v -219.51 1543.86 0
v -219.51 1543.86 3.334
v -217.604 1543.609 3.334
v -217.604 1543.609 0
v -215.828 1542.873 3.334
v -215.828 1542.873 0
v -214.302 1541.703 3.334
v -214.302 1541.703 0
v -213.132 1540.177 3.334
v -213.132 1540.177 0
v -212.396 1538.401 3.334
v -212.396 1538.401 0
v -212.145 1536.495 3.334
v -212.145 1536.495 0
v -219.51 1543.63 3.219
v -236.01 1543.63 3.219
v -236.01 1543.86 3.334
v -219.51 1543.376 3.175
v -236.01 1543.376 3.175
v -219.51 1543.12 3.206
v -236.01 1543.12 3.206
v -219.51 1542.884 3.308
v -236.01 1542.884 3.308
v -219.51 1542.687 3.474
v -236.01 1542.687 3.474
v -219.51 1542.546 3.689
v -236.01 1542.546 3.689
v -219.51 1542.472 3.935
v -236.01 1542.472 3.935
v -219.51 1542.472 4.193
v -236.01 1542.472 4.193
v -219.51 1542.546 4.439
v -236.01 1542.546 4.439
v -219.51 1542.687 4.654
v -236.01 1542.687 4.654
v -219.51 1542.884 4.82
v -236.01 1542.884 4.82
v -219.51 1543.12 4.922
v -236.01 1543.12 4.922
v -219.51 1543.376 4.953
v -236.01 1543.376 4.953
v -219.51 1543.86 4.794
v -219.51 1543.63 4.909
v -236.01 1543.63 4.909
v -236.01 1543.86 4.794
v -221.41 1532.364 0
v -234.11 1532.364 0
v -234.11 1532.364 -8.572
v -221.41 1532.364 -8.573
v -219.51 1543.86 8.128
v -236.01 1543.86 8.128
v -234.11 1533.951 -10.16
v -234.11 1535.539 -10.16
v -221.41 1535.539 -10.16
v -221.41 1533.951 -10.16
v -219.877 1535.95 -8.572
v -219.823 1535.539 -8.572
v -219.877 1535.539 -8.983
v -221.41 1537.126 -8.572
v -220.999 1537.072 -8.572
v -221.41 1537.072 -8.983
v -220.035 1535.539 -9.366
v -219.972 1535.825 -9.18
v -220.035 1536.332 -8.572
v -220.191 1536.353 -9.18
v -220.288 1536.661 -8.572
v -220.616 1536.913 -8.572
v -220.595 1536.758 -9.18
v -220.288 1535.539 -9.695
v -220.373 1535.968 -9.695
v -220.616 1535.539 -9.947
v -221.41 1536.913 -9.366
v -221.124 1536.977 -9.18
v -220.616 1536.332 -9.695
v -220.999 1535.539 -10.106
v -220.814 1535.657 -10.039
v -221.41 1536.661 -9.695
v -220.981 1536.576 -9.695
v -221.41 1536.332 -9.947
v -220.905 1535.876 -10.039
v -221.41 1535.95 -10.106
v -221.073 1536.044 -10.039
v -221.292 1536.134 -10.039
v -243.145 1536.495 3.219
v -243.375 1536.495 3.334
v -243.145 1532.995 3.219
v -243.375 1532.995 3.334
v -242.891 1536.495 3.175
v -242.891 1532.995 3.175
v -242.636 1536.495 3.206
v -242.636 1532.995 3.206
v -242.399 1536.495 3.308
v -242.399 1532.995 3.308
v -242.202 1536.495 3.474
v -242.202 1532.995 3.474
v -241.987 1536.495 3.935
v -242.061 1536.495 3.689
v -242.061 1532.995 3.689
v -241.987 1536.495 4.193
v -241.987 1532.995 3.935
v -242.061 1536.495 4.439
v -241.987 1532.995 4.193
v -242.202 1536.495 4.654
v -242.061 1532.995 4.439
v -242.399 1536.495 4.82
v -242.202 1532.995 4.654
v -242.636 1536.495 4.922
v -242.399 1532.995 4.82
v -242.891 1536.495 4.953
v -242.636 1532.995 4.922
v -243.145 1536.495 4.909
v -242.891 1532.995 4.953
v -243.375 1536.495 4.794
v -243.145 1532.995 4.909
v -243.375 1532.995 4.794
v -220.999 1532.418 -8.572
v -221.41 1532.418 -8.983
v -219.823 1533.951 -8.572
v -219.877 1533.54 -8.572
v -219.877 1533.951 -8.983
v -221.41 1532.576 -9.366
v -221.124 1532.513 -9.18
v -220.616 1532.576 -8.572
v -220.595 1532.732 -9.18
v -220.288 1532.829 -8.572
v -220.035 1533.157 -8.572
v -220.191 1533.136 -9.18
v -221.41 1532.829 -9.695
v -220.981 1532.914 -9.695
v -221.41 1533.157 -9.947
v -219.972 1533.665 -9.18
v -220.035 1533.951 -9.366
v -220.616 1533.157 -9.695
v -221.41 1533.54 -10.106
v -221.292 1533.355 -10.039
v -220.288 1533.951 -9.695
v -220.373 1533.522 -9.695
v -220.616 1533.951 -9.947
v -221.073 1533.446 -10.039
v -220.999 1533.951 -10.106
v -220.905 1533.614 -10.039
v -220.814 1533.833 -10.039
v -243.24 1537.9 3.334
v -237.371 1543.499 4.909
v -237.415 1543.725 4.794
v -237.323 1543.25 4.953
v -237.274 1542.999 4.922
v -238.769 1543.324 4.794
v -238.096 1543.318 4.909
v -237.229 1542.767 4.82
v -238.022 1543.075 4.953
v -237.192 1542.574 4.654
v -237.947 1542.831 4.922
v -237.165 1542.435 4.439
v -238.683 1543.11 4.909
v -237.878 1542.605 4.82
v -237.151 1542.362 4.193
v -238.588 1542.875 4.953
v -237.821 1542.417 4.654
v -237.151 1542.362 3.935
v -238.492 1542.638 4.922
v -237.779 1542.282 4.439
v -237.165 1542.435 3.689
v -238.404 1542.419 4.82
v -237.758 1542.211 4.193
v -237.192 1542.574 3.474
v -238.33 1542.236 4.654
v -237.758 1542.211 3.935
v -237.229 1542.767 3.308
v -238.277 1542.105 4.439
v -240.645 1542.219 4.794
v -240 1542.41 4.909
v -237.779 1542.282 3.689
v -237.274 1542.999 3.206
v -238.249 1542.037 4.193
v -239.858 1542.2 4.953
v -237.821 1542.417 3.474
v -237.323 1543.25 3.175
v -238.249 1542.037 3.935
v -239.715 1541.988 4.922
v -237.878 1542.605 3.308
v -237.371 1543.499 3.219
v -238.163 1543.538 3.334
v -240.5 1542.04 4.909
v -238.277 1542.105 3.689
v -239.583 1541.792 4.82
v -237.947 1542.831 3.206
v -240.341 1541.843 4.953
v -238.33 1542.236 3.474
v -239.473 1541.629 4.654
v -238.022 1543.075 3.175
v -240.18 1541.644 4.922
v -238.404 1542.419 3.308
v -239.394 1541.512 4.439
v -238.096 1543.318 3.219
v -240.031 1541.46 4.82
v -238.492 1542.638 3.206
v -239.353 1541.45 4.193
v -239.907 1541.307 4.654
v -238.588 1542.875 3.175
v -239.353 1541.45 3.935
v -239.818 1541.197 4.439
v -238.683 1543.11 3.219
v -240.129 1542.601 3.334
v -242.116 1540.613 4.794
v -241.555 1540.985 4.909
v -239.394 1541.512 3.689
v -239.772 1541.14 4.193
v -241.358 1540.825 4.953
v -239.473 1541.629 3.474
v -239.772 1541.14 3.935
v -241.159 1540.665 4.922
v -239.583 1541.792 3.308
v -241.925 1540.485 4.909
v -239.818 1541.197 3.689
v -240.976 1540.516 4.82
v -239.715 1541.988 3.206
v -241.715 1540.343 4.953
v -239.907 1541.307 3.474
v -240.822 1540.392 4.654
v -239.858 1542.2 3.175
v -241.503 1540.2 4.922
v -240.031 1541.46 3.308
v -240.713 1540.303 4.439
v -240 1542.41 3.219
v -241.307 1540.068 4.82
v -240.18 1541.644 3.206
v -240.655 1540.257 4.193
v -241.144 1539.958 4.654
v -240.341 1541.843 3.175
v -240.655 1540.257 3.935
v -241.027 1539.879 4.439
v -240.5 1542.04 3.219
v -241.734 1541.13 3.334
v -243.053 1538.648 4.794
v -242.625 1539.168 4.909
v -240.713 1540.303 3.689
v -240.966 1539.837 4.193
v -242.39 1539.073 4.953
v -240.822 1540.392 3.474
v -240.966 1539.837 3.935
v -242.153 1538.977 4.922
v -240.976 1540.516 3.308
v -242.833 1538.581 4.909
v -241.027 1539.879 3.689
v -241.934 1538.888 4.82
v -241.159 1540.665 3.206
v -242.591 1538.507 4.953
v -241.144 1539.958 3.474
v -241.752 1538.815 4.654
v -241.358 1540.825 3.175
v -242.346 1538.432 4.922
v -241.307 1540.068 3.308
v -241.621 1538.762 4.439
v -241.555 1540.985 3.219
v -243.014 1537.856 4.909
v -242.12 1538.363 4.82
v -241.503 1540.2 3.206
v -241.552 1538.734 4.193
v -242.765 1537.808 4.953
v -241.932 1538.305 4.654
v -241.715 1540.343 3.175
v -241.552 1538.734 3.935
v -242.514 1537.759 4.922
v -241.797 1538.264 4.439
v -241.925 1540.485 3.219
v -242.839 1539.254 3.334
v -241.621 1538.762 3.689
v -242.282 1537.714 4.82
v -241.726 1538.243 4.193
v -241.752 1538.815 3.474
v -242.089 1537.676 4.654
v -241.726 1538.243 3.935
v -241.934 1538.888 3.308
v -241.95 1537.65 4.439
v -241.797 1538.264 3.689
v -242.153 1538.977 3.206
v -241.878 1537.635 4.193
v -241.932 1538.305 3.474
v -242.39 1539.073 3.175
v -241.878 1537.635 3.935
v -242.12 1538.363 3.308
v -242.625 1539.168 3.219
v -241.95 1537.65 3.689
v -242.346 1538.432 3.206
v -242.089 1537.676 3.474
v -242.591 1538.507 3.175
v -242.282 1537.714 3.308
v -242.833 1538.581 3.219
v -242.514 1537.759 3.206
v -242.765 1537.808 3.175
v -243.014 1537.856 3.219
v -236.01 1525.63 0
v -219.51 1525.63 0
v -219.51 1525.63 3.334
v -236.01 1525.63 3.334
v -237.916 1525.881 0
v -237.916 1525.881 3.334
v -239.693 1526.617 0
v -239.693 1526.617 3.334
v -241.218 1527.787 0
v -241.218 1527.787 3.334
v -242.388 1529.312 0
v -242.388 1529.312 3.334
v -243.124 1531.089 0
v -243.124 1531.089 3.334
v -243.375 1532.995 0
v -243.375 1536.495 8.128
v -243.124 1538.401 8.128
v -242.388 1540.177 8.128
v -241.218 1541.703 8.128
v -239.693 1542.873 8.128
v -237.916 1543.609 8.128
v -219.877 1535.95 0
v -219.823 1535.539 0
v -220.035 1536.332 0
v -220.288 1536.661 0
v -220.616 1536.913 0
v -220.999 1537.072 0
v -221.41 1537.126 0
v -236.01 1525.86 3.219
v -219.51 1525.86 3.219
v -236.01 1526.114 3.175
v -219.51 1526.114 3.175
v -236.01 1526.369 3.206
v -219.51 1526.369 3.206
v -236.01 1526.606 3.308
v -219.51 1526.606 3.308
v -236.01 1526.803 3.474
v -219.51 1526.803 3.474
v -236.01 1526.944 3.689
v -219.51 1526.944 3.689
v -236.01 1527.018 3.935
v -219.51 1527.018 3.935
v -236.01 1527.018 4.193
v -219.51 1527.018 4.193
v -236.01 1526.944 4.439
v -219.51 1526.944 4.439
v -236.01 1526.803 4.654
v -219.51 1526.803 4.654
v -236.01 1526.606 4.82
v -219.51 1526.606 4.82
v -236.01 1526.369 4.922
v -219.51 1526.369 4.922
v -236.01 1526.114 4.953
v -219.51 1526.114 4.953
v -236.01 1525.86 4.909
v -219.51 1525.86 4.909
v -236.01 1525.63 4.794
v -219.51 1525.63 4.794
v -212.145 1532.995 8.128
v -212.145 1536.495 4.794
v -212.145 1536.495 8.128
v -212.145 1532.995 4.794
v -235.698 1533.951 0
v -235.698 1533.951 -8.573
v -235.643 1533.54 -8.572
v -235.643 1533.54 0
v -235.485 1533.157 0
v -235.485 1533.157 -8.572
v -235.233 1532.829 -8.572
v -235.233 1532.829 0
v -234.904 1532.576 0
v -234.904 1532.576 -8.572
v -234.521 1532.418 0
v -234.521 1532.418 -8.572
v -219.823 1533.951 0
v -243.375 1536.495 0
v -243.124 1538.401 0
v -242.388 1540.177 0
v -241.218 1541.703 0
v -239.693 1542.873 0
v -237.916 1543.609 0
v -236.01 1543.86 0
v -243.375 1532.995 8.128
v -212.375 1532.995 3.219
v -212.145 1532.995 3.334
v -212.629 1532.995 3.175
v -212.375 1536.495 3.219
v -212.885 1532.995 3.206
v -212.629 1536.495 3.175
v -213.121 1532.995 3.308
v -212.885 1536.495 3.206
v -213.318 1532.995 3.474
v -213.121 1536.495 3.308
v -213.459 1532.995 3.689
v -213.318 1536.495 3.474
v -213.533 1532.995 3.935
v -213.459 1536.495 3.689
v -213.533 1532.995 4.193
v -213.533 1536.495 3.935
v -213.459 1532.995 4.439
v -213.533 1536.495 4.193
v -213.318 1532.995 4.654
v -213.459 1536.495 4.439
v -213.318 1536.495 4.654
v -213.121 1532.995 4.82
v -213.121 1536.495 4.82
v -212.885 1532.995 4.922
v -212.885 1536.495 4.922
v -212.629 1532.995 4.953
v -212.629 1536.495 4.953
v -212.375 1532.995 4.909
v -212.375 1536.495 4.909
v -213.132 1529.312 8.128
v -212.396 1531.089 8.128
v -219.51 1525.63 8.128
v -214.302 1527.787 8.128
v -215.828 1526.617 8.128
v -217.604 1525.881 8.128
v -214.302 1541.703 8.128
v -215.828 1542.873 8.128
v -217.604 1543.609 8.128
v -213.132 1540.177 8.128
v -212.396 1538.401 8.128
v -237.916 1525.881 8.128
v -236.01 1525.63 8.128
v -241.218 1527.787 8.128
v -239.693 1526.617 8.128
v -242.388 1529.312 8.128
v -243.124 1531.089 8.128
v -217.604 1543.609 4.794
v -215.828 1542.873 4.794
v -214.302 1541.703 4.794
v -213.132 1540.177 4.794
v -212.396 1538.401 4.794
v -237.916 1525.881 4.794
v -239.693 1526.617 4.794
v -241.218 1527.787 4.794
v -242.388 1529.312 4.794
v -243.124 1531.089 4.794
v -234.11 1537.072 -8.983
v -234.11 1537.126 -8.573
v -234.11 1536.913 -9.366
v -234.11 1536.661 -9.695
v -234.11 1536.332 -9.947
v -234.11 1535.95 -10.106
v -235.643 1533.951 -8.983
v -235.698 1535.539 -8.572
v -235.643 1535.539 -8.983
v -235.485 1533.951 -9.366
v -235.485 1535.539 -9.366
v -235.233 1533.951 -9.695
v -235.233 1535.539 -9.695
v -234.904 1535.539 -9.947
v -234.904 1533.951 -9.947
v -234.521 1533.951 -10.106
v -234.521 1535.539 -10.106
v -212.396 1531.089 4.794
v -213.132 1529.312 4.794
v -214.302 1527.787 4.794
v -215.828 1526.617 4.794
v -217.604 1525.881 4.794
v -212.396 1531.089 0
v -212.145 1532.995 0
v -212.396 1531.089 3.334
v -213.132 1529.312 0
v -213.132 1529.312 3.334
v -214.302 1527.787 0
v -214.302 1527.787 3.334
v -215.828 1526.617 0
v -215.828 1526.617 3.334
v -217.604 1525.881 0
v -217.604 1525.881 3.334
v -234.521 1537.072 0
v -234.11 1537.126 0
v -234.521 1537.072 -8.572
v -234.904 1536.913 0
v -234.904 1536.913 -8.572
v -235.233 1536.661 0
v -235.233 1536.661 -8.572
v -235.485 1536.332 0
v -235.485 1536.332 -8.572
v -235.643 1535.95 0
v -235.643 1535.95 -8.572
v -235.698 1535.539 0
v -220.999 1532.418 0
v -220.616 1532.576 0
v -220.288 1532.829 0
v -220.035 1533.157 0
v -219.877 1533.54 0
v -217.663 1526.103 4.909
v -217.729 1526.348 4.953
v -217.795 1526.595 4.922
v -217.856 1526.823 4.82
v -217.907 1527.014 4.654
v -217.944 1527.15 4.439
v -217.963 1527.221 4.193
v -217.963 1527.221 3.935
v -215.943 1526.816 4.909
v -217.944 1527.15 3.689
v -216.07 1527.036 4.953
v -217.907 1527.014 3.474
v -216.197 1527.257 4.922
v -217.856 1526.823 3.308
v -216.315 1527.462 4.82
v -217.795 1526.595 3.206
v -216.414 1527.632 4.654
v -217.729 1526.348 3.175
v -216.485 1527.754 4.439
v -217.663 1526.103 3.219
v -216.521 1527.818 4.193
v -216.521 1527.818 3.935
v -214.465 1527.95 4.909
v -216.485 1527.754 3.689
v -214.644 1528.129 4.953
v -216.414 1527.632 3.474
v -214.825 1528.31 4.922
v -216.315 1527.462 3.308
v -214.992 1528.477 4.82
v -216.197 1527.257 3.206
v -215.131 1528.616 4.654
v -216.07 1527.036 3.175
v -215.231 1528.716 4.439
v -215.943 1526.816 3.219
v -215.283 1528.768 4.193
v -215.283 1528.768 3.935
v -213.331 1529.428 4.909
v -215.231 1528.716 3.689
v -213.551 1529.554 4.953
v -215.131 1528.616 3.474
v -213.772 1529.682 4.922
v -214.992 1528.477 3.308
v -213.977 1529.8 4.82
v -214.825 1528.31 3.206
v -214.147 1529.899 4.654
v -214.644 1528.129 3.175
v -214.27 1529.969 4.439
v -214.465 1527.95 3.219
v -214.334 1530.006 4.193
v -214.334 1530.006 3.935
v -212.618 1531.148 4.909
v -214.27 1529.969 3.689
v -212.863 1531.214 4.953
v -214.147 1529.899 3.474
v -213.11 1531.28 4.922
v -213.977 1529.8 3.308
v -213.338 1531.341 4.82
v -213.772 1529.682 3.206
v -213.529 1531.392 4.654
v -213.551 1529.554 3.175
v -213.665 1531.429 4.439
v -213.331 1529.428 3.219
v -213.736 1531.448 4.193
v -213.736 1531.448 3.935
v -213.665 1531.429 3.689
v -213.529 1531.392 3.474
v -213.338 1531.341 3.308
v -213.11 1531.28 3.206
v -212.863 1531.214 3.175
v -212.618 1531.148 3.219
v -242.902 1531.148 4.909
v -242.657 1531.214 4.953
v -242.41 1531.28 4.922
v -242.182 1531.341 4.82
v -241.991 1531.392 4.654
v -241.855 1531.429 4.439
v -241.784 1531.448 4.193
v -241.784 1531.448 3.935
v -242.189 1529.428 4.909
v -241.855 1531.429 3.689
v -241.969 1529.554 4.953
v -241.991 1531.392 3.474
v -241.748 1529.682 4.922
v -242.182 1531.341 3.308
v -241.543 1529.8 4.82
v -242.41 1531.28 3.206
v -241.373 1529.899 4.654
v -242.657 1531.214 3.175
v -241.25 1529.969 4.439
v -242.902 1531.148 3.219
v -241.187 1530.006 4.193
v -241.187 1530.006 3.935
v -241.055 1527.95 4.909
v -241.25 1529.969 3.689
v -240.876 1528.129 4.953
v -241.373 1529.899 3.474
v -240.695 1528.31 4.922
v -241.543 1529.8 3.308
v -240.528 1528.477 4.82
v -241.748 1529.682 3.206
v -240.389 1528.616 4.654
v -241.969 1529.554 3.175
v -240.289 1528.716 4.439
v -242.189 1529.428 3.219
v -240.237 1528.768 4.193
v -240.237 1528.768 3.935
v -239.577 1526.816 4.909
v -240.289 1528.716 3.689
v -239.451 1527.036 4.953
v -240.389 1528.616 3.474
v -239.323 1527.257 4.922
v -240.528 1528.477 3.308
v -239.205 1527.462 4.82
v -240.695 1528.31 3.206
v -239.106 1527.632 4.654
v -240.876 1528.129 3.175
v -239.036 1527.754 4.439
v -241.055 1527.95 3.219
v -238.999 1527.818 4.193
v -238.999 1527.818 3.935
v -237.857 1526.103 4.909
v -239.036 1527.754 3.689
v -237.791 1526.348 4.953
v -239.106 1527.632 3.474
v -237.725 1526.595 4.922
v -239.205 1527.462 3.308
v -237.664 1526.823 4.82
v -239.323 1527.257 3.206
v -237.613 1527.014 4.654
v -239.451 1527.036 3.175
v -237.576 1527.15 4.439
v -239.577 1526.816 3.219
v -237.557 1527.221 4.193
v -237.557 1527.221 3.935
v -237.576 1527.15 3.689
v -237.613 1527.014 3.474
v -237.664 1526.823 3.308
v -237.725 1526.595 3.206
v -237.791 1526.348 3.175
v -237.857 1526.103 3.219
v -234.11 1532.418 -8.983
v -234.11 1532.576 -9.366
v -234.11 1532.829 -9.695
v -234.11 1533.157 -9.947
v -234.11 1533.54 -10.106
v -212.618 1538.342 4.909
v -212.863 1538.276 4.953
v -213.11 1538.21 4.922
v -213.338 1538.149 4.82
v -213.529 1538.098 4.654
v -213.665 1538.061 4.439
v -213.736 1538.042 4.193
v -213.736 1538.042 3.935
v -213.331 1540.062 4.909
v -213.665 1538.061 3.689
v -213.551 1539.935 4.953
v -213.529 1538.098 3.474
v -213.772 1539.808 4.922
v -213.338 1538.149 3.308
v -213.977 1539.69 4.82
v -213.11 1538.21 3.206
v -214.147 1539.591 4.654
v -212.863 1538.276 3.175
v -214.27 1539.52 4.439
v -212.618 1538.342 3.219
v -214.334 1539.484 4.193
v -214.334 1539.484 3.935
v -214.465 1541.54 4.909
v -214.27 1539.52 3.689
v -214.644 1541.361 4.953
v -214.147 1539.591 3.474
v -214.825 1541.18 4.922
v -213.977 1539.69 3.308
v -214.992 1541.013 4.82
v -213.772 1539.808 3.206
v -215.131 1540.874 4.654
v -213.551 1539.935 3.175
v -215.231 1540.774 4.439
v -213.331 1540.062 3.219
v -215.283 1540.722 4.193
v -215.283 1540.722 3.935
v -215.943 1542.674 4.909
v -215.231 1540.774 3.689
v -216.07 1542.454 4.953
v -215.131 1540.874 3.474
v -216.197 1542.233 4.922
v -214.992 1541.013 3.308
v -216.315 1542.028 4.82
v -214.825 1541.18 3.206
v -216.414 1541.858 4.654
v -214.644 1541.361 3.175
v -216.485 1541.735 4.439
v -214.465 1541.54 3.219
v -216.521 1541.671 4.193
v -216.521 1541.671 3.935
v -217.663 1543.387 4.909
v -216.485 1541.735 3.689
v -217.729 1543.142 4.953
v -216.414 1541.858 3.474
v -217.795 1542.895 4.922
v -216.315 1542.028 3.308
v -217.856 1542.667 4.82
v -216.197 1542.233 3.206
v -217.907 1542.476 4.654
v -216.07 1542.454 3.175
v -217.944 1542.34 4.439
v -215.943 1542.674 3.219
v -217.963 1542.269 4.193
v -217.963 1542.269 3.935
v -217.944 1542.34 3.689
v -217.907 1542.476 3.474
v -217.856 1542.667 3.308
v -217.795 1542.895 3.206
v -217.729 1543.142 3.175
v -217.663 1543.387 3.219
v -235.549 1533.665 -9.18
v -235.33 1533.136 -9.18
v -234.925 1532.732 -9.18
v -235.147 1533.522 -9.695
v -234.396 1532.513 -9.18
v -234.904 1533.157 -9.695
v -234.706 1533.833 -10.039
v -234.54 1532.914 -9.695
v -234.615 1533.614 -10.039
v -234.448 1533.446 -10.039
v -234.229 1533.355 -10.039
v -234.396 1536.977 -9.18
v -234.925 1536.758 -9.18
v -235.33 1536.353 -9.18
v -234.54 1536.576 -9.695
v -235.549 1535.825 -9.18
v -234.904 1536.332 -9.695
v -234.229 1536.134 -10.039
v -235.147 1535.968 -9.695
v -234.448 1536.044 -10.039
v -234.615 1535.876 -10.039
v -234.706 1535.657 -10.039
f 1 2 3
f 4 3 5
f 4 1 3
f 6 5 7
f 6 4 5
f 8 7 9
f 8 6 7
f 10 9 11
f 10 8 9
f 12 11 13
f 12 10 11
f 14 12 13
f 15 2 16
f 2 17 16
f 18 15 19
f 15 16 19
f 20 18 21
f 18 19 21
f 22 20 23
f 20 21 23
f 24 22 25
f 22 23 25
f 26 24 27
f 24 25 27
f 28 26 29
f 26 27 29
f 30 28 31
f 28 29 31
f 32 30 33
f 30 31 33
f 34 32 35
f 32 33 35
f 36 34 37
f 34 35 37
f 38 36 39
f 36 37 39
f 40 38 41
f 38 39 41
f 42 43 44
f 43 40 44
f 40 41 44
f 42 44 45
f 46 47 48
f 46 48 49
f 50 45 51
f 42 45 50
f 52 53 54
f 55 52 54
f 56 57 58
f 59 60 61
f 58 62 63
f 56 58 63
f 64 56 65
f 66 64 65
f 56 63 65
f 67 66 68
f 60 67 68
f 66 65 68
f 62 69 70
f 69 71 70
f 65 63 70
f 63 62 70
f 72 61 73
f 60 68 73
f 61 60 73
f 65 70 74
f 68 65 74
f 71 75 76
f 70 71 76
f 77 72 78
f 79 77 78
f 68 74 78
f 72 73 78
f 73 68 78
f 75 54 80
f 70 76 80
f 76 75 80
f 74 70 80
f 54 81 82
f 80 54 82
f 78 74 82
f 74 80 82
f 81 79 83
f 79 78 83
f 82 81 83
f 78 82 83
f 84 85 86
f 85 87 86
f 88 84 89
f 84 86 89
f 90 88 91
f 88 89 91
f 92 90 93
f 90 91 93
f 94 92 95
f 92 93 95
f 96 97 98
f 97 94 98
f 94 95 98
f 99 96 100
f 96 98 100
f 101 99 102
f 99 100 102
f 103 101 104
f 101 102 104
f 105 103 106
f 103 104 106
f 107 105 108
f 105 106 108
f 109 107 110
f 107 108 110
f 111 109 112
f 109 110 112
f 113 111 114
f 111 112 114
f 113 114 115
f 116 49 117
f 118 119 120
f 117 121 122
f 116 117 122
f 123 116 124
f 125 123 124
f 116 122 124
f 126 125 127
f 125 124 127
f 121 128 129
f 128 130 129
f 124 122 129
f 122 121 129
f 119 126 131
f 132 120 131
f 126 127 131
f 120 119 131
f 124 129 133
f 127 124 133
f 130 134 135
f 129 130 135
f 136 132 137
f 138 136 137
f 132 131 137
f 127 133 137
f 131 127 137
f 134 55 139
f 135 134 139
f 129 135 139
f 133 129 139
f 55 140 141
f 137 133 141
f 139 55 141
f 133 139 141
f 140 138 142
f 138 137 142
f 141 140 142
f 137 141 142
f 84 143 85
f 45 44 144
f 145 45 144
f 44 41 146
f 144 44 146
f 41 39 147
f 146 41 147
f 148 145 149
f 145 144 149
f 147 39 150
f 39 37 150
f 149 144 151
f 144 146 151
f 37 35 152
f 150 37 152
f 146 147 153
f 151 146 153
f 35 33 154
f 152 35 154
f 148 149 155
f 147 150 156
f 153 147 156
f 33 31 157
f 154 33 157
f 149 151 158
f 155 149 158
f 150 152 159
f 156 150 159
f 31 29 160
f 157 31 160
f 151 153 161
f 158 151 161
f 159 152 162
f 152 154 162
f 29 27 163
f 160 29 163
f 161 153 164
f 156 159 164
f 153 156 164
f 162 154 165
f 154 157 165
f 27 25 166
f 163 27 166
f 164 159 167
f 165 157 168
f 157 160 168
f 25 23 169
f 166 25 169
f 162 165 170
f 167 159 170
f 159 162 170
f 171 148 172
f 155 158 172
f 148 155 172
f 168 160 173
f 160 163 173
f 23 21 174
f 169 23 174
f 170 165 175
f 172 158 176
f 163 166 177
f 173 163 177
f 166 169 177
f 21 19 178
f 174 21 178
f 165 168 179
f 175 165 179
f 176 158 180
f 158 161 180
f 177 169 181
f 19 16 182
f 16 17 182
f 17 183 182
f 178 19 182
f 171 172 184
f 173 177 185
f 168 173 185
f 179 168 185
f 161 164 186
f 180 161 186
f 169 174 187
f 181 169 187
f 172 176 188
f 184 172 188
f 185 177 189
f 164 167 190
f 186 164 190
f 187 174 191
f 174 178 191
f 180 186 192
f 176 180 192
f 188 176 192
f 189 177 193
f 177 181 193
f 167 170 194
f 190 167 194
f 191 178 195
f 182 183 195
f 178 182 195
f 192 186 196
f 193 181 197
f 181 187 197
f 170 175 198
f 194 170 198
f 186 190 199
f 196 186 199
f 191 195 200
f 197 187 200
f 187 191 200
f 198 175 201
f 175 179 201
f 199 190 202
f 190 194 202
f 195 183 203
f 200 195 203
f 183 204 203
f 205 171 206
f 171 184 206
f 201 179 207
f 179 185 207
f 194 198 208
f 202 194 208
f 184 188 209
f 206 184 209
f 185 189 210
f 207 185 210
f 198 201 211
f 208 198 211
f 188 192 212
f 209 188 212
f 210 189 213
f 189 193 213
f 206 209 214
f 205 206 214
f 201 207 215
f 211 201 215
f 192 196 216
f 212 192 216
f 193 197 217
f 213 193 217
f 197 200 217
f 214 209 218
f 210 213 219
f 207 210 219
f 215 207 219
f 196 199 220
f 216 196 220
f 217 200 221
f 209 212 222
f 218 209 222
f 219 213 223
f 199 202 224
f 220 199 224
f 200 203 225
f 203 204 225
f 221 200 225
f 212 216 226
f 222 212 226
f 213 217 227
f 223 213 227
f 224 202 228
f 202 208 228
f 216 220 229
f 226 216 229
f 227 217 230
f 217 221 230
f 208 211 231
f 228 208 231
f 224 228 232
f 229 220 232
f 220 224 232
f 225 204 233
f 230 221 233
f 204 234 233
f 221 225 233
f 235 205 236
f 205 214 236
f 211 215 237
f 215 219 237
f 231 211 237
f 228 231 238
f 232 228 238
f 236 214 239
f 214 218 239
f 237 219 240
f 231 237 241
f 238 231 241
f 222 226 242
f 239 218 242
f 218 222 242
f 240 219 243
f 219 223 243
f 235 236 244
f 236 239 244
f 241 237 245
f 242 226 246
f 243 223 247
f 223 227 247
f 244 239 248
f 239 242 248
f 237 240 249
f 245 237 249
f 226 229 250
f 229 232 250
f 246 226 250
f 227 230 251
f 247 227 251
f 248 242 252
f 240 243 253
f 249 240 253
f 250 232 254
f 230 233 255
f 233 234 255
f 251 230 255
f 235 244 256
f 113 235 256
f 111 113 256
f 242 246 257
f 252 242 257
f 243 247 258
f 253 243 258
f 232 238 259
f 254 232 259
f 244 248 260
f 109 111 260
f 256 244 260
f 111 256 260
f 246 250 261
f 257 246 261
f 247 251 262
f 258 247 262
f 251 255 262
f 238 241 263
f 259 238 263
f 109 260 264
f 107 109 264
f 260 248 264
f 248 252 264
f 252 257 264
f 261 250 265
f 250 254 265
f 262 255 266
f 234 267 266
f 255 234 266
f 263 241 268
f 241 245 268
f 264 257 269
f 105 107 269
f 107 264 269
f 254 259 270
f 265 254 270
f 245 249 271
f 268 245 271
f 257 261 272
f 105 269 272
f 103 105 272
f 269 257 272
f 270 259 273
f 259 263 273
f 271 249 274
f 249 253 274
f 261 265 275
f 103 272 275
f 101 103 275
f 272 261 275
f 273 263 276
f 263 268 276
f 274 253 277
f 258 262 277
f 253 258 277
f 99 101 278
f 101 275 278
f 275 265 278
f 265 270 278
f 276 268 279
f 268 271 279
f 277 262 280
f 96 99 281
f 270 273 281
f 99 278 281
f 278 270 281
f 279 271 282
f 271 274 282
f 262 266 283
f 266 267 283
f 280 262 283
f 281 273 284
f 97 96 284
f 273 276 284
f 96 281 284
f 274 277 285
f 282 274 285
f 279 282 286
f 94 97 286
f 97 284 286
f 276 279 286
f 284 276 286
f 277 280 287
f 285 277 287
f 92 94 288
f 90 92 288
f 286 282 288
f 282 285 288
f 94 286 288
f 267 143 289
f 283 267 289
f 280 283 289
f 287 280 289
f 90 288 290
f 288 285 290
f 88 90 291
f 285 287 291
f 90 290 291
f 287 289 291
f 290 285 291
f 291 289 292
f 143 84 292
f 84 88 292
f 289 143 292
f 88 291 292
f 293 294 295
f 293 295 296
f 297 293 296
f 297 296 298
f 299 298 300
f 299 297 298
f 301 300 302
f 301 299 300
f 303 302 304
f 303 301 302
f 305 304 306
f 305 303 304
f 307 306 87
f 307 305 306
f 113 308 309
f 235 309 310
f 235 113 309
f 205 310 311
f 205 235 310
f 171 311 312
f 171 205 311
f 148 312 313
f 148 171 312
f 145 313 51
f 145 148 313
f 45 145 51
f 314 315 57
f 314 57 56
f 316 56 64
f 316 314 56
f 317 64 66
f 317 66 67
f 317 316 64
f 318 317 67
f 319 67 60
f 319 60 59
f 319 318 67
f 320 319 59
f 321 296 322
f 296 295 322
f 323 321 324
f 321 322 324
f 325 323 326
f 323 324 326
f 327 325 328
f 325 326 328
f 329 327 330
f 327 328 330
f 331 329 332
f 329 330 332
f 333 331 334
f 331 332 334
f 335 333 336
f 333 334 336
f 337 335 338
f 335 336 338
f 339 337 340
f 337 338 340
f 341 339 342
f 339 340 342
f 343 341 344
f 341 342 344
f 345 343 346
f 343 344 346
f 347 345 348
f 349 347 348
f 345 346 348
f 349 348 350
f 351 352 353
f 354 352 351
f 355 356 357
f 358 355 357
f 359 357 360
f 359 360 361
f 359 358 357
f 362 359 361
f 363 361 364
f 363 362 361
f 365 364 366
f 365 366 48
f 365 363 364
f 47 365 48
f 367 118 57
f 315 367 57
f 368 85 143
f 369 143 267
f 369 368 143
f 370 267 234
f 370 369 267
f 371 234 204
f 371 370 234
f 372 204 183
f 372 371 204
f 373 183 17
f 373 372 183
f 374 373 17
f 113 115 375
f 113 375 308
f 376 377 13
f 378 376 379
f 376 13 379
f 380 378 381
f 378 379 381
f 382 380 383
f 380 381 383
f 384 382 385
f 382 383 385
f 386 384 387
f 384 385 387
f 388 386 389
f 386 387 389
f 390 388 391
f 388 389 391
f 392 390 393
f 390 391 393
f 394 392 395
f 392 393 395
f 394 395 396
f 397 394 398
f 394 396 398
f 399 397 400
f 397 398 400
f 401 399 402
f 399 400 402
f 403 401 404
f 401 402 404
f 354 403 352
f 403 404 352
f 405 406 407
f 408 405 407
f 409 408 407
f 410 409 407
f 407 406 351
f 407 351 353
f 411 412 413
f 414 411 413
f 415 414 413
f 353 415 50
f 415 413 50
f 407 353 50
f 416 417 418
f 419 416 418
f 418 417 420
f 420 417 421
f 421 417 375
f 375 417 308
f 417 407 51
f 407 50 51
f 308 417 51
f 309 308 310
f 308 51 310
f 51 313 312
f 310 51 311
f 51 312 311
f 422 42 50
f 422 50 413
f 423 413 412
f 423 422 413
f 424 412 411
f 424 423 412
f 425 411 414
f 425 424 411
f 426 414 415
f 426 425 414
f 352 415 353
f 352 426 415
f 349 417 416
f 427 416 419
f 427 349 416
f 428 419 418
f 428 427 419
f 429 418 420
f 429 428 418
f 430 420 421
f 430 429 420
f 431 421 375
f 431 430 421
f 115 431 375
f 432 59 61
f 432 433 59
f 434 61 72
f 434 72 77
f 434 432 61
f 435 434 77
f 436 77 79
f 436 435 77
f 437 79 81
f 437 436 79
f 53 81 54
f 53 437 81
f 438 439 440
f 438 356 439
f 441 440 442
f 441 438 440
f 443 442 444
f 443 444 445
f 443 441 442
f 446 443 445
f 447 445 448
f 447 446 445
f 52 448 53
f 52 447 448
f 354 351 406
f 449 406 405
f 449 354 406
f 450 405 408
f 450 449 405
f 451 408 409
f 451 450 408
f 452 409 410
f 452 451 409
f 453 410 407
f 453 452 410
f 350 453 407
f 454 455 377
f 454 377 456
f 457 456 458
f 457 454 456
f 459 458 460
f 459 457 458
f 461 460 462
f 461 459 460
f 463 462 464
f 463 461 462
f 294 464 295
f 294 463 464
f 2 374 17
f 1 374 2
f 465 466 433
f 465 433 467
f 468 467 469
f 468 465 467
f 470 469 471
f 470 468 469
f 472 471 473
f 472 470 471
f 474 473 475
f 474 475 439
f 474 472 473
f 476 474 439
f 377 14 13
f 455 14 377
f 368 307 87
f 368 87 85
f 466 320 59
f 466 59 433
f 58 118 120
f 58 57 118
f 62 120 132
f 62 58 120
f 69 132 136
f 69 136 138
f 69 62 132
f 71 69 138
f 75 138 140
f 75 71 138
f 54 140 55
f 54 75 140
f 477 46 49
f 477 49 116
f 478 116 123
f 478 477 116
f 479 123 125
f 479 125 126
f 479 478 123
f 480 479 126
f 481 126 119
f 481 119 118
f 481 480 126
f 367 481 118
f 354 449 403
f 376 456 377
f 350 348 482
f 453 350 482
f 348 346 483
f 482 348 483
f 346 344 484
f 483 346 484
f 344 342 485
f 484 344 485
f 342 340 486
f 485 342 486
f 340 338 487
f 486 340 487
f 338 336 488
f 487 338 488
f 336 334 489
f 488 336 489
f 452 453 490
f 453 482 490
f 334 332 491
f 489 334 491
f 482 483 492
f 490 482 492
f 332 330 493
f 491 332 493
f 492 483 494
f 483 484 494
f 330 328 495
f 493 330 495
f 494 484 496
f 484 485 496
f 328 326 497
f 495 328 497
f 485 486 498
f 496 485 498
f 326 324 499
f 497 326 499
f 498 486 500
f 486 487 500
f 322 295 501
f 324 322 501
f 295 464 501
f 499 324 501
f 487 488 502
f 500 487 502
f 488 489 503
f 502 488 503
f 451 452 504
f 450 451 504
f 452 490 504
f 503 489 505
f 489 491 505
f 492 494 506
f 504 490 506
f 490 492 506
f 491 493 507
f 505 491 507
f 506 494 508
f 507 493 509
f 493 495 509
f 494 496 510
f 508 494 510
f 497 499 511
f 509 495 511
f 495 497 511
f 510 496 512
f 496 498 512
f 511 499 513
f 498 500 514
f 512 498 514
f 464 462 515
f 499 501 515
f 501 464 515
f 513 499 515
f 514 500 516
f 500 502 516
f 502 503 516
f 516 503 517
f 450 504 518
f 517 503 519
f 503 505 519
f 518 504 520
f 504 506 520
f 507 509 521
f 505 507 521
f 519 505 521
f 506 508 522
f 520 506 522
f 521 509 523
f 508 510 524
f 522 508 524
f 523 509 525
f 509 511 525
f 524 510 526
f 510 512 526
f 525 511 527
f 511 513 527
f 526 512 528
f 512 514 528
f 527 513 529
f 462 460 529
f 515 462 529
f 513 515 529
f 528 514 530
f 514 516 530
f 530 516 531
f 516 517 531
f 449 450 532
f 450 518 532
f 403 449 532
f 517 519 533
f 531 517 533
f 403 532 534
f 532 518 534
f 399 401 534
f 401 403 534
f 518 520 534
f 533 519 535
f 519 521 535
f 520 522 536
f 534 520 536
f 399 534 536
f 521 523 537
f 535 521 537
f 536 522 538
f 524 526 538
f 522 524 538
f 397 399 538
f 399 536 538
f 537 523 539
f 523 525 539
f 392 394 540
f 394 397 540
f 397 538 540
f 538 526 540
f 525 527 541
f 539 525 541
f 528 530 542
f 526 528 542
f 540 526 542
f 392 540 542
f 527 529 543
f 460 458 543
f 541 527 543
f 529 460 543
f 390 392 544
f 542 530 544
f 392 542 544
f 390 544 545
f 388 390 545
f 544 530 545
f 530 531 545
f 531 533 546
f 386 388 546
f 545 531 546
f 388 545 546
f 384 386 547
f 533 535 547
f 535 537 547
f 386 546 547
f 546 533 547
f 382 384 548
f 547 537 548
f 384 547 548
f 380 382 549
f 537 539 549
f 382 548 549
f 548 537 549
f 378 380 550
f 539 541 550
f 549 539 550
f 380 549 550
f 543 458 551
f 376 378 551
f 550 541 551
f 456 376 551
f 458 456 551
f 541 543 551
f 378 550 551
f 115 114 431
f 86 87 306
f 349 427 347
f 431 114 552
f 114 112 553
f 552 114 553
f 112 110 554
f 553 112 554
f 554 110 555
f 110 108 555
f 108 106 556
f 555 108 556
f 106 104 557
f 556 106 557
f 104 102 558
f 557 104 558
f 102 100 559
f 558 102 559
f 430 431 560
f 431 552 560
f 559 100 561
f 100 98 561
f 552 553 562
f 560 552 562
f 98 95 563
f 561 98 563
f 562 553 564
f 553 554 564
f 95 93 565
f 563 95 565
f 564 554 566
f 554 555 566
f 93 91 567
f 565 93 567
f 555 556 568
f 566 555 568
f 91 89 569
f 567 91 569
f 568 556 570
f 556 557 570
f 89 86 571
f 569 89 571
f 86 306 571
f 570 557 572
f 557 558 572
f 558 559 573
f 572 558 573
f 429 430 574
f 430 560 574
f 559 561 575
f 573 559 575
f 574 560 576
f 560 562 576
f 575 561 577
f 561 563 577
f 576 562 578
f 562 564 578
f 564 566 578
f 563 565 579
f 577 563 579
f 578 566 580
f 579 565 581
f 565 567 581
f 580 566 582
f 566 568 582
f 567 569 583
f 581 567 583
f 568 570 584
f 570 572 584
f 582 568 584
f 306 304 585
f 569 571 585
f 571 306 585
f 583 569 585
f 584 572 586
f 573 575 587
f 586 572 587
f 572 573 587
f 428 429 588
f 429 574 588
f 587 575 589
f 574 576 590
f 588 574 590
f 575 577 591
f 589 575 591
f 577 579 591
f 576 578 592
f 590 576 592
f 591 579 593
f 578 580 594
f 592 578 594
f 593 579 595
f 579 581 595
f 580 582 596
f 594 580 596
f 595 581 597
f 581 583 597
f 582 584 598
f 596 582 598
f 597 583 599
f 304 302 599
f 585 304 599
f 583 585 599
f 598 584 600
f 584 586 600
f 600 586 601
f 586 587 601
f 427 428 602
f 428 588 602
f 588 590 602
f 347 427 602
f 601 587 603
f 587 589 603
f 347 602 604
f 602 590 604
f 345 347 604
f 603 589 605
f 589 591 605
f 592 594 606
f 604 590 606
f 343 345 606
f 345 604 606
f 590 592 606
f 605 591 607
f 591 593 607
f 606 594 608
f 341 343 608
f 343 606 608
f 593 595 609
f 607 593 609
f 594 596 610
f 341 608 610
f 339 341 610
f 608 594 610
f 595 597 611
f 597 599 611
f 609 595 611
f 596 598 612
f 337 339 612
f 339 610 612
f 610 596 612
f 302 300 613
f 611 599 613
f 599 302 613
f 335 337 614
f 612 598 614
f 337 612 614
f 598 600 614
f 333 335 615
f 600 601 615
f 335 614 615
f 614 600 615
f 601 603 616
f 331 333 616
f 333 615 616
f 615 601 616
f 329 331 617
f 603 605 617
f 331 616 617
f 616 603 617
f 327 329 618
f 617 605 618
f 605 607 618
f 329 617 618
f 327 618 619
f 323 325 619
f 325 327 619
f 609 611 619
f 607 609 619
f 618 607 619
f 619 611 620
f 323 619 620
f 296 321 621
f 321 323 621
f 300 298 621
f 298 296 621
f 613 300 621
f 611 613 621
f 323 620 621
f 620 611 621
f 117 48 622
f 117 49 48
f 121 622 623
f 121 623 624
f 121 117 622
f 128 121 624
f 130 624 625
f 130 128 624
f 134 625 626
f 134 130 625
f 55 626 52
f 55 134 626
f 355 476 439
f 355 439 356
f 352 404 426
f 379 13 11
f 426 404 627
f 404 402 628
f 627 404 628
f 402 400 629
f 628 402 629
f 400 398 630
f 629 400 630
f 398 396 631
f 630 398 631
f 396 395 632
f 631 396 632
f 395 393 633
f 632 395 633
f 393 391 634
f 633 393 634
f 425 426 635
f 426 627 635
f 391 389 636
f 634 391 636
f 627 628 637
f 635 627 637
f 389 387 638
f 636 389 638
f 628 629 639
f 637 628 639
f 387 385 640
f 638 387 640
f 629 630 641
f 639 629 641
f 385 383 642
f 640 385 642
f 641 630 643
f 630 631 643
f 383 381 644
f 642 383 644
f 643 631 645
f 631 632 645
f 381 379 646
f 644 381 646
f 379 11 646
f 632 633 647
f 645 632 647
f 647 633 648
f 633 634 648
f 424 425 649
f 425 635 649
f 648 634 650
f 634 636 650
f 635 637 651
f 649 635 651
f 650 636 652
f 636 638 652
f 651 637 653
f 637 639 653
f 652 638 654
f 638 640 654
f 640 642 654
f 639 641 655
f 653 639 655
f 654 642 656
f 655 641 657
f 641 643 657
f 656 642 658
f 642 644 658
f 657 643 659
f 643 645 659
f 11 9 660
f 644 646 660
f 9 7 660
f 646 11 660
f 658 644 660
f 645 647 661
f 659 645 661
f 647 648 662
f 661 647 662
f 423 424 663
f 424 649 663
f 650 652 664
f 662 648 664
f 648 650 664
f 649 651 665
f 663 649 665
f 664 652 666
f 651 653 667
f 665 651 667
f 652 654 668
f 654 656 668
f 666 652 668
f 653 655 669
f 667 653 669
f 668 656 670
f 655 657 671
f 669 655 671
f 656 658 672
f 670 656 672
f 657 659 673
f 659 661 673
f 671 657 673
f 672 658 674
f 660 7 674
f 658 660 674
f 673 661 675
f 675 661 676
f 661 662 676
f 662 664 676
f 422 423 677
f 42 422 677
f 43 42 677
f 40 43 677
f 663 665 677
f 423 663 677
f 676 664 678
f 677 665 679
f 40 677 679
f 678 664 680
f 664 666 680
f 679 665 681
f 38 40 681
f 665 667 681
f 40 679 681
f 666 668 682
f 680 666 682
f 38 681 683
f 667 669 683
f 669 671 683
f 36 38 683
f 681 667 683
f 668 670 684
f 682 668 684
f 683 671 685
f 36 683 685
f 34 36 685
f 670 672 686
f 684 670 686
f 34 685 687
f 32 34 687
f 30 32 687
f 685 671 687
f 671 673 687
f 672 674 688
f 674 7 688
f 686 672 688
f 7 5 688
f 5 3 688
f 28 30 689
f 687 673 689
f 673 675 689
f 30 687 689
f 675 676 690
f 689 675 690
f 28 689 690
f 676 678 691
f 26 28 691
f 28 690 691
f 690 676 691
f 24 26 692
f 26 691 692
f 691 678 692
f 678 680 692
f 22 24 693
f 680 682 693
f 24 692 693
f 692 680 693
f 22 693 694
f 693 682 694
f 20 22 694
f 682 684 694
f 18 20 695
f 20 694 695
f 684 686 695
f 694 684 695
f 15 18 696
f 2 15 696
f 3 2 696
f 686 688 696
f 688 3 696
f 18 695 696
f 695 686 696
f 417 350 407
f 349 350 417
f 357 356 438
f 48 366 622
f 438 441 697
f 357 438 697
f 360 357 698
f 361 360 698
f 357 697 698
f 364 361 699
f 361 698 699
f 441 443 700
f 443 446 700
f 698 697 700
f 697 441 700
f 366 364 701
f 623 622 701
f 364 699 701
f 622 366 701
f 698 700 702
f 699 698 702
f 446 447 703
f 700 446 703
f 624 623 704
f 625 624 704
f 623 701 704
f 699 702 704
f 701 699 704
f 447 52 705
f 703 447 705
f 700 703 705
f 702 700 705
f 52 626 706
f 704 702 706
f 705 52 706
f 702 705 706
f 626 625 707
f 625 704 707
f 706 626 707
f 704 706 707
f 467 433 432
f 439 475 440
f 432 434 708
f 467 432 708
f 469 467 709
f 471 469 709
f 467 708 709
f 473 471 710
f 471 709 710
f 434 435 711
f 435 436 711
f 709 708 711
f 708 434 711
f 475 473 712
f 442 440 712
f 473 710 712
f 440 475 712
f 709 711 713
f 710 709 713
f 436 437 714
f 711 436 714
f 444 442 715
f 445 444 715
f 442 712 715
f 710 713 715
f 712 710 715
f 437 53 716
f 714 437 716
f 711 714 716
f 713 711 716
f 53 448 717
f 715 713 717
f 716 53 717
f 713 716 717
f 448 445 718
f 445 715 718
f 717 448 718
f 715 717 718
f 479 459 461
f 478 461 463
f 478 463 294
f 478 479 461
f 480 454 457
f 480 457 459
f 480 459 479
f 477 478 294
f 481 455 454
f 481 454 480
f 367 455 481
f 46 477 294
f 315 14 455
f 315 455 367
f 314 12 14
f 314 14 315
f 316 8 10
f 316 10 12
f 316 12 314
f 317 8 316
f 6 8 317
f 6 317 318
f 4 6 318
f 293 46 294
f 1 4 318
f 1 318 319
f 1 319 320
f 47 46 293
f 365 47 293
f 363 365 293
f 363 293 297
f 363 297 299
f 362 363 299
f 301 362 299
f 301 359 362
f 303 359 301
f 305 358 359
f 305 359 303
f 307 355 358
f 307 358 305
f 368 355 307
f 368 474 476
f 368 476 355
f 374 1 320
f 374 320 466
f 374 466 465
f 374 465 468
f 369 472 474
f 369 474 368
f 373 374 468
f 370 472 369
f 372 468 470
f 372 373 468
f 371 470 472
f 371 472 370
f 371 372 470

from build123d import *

# Parameters (mm, degrees)
BOSS_EXTRUDE1_DEPTH = 8.128
BOSS_EXTRUDE3_DEPTH = 10.16
FILLET1_R           = 1.5875
SKETCH12_R          = 0.889


with BuildPart() as part:
    # Sketch1 → Boss-Extrude1 (new body)
    with BuildSketch(Plane.XY):
        with BuildLine():
            Line((-243.375083311, 1536.494901352), (-243.375083311, 1532.994901352))
            ThreePointArc((-243.375083311, 1532.994901352), (-241.217924755, 1527.787059909), (-236.010083311, 1525.629901352))
            Line((-236.010083311, 1525.629901352), (-219.510083311, 1525.629901352))
            ThreePointArc((-219.510083311, 1525.629901352), (-214.302241868, 1527.787059909), (-212.145083311, 1532.994901352))
            Line((-212.145083311, 1532.994901352), (-212.145083311, 1536.494901352))
            ThreePointArc((-212.145083311, 1536.494901352), (-214.302241868, 1541.702742796), (-219.510083311, 1543.859901352))
            Line((-219.510083311, 1543.859901352), (-236.010083311, 1543.859901352))
            ThreePointArc((-236.010083311, 1543.859901352), (-241.217924755, 1541.702742796), (-243.375083311, 1536.494901352))
        make_face()
    extrude(amount=BOSS_EXTRUDE1_DEPTH)

    # Sketch3 → Boss-Extrude3 (add)
    with BuildSketch(Plane(origin=(0, 0, 0), x_dir=(-1, 0, 0), z_dir=(0, 0, -1))):
        with BuildLine():
            Line((234.110083311, 1532.363651352), (221.410083311, 1532.363651352))
            ThreePointArc((221.410083311, 1532.363651352), (220.287551296, 1532.828619337), (219.822583311, 1533.951151352))
            Line((219.822583311, 1533.951151352), (219.822583311, 1535.538651352))
            ThreePointArc((219.822583311, 1535.538651352), (220.287551296, 1536.661183368), (221.410083311, 1537.126151352))
            Line((221.410083311, 1537.126151352), (234.110083311, 1537.126151352))
            ThreePointArc((234.110083311, 1537.126151352), (235.232615326, 1536.661183368), (235.697583311, 1535.538651352))
            Line((235.697583311, 1535.538651352), (235.697583311, 1533.951151352))
            ThreePointArc((235.697583311, 1533.951151352), (235.232615326, 1532.828619337), (234.110083311, 1532.363651352))
        make_face()
    extrude(amount=BOSS_EXTRUDE3_DEPTH)

    # Fillet1
    fillet1_edges = [part.edges().sort_by_distance(p)[0] for p in [
        (-227.760083311, 1537.126151352, -10.16),
        (-235.232615326, 1536.661183368, -10.16),
        (-235.697583311, 1534.744901352, -10.16),
        (-235.232615326, 1532.828619337, -10.16),
        (-227.760083311, 1532.363651352, -10.16),
        (-220.287551296, 1532.828619337, -10.16),
        (-219.822583311, 1534.744901352, -10.16),
        (-220.287551296, 1536.661183368, -10.16),
    ]]
    fillet(fillet1_edges, radius=FILLET1_R)

    # Cut-Sweep1: sweep along a path in Sketch13
    with BuildLine(Plane.XY.offset(4.064)) as cut_sweep1_path:
        Line((-243.375083311, 1536.494901352), (-243.375083311, 1532.994901352))
        ThreePointArc((-243.375083311, 1532.994901352), (-241.217924755, 1527.787059909), (-236.010083311, 1525.629901352))
        Line((-236.010083311, 1525.629901352), (-219.510083311, 1525.629901352))
        ThreePointArc((-219.510083311, 1525.629901352), (-214.302241868, 1527.787059909), (-212.145083311, 1532.994901352))
        Line((-212.145083311, 1532.994901352), (-212.145083311, 1536.494901352))
        ThreePointArc((-212.145083311, 1536.494901352), (-214.302241868, 1541.702742796), (-219.510083311, 1543.859901352))
        Line((-219.510083311, 1543.859901352), (-236.010083311, 1543.859901352))
        ThreePointArc((-236.010083311, 1543.859901352), (-241.217924755, 1541.702742796), (-243.375083311, 1536.494901352))
    # Sketch12 → Cut-Sweep1 (sweep, cut)
    with BuildSketch(Plane.ZY.offset(227.760083311)):
        with Locations((4.064, 1543.351901352)):
            Circle(SKETCH12_R)
    sweep(path=cut_sweep1_path.line, mode=Mode.SUBTRACT)


solid = part.part
